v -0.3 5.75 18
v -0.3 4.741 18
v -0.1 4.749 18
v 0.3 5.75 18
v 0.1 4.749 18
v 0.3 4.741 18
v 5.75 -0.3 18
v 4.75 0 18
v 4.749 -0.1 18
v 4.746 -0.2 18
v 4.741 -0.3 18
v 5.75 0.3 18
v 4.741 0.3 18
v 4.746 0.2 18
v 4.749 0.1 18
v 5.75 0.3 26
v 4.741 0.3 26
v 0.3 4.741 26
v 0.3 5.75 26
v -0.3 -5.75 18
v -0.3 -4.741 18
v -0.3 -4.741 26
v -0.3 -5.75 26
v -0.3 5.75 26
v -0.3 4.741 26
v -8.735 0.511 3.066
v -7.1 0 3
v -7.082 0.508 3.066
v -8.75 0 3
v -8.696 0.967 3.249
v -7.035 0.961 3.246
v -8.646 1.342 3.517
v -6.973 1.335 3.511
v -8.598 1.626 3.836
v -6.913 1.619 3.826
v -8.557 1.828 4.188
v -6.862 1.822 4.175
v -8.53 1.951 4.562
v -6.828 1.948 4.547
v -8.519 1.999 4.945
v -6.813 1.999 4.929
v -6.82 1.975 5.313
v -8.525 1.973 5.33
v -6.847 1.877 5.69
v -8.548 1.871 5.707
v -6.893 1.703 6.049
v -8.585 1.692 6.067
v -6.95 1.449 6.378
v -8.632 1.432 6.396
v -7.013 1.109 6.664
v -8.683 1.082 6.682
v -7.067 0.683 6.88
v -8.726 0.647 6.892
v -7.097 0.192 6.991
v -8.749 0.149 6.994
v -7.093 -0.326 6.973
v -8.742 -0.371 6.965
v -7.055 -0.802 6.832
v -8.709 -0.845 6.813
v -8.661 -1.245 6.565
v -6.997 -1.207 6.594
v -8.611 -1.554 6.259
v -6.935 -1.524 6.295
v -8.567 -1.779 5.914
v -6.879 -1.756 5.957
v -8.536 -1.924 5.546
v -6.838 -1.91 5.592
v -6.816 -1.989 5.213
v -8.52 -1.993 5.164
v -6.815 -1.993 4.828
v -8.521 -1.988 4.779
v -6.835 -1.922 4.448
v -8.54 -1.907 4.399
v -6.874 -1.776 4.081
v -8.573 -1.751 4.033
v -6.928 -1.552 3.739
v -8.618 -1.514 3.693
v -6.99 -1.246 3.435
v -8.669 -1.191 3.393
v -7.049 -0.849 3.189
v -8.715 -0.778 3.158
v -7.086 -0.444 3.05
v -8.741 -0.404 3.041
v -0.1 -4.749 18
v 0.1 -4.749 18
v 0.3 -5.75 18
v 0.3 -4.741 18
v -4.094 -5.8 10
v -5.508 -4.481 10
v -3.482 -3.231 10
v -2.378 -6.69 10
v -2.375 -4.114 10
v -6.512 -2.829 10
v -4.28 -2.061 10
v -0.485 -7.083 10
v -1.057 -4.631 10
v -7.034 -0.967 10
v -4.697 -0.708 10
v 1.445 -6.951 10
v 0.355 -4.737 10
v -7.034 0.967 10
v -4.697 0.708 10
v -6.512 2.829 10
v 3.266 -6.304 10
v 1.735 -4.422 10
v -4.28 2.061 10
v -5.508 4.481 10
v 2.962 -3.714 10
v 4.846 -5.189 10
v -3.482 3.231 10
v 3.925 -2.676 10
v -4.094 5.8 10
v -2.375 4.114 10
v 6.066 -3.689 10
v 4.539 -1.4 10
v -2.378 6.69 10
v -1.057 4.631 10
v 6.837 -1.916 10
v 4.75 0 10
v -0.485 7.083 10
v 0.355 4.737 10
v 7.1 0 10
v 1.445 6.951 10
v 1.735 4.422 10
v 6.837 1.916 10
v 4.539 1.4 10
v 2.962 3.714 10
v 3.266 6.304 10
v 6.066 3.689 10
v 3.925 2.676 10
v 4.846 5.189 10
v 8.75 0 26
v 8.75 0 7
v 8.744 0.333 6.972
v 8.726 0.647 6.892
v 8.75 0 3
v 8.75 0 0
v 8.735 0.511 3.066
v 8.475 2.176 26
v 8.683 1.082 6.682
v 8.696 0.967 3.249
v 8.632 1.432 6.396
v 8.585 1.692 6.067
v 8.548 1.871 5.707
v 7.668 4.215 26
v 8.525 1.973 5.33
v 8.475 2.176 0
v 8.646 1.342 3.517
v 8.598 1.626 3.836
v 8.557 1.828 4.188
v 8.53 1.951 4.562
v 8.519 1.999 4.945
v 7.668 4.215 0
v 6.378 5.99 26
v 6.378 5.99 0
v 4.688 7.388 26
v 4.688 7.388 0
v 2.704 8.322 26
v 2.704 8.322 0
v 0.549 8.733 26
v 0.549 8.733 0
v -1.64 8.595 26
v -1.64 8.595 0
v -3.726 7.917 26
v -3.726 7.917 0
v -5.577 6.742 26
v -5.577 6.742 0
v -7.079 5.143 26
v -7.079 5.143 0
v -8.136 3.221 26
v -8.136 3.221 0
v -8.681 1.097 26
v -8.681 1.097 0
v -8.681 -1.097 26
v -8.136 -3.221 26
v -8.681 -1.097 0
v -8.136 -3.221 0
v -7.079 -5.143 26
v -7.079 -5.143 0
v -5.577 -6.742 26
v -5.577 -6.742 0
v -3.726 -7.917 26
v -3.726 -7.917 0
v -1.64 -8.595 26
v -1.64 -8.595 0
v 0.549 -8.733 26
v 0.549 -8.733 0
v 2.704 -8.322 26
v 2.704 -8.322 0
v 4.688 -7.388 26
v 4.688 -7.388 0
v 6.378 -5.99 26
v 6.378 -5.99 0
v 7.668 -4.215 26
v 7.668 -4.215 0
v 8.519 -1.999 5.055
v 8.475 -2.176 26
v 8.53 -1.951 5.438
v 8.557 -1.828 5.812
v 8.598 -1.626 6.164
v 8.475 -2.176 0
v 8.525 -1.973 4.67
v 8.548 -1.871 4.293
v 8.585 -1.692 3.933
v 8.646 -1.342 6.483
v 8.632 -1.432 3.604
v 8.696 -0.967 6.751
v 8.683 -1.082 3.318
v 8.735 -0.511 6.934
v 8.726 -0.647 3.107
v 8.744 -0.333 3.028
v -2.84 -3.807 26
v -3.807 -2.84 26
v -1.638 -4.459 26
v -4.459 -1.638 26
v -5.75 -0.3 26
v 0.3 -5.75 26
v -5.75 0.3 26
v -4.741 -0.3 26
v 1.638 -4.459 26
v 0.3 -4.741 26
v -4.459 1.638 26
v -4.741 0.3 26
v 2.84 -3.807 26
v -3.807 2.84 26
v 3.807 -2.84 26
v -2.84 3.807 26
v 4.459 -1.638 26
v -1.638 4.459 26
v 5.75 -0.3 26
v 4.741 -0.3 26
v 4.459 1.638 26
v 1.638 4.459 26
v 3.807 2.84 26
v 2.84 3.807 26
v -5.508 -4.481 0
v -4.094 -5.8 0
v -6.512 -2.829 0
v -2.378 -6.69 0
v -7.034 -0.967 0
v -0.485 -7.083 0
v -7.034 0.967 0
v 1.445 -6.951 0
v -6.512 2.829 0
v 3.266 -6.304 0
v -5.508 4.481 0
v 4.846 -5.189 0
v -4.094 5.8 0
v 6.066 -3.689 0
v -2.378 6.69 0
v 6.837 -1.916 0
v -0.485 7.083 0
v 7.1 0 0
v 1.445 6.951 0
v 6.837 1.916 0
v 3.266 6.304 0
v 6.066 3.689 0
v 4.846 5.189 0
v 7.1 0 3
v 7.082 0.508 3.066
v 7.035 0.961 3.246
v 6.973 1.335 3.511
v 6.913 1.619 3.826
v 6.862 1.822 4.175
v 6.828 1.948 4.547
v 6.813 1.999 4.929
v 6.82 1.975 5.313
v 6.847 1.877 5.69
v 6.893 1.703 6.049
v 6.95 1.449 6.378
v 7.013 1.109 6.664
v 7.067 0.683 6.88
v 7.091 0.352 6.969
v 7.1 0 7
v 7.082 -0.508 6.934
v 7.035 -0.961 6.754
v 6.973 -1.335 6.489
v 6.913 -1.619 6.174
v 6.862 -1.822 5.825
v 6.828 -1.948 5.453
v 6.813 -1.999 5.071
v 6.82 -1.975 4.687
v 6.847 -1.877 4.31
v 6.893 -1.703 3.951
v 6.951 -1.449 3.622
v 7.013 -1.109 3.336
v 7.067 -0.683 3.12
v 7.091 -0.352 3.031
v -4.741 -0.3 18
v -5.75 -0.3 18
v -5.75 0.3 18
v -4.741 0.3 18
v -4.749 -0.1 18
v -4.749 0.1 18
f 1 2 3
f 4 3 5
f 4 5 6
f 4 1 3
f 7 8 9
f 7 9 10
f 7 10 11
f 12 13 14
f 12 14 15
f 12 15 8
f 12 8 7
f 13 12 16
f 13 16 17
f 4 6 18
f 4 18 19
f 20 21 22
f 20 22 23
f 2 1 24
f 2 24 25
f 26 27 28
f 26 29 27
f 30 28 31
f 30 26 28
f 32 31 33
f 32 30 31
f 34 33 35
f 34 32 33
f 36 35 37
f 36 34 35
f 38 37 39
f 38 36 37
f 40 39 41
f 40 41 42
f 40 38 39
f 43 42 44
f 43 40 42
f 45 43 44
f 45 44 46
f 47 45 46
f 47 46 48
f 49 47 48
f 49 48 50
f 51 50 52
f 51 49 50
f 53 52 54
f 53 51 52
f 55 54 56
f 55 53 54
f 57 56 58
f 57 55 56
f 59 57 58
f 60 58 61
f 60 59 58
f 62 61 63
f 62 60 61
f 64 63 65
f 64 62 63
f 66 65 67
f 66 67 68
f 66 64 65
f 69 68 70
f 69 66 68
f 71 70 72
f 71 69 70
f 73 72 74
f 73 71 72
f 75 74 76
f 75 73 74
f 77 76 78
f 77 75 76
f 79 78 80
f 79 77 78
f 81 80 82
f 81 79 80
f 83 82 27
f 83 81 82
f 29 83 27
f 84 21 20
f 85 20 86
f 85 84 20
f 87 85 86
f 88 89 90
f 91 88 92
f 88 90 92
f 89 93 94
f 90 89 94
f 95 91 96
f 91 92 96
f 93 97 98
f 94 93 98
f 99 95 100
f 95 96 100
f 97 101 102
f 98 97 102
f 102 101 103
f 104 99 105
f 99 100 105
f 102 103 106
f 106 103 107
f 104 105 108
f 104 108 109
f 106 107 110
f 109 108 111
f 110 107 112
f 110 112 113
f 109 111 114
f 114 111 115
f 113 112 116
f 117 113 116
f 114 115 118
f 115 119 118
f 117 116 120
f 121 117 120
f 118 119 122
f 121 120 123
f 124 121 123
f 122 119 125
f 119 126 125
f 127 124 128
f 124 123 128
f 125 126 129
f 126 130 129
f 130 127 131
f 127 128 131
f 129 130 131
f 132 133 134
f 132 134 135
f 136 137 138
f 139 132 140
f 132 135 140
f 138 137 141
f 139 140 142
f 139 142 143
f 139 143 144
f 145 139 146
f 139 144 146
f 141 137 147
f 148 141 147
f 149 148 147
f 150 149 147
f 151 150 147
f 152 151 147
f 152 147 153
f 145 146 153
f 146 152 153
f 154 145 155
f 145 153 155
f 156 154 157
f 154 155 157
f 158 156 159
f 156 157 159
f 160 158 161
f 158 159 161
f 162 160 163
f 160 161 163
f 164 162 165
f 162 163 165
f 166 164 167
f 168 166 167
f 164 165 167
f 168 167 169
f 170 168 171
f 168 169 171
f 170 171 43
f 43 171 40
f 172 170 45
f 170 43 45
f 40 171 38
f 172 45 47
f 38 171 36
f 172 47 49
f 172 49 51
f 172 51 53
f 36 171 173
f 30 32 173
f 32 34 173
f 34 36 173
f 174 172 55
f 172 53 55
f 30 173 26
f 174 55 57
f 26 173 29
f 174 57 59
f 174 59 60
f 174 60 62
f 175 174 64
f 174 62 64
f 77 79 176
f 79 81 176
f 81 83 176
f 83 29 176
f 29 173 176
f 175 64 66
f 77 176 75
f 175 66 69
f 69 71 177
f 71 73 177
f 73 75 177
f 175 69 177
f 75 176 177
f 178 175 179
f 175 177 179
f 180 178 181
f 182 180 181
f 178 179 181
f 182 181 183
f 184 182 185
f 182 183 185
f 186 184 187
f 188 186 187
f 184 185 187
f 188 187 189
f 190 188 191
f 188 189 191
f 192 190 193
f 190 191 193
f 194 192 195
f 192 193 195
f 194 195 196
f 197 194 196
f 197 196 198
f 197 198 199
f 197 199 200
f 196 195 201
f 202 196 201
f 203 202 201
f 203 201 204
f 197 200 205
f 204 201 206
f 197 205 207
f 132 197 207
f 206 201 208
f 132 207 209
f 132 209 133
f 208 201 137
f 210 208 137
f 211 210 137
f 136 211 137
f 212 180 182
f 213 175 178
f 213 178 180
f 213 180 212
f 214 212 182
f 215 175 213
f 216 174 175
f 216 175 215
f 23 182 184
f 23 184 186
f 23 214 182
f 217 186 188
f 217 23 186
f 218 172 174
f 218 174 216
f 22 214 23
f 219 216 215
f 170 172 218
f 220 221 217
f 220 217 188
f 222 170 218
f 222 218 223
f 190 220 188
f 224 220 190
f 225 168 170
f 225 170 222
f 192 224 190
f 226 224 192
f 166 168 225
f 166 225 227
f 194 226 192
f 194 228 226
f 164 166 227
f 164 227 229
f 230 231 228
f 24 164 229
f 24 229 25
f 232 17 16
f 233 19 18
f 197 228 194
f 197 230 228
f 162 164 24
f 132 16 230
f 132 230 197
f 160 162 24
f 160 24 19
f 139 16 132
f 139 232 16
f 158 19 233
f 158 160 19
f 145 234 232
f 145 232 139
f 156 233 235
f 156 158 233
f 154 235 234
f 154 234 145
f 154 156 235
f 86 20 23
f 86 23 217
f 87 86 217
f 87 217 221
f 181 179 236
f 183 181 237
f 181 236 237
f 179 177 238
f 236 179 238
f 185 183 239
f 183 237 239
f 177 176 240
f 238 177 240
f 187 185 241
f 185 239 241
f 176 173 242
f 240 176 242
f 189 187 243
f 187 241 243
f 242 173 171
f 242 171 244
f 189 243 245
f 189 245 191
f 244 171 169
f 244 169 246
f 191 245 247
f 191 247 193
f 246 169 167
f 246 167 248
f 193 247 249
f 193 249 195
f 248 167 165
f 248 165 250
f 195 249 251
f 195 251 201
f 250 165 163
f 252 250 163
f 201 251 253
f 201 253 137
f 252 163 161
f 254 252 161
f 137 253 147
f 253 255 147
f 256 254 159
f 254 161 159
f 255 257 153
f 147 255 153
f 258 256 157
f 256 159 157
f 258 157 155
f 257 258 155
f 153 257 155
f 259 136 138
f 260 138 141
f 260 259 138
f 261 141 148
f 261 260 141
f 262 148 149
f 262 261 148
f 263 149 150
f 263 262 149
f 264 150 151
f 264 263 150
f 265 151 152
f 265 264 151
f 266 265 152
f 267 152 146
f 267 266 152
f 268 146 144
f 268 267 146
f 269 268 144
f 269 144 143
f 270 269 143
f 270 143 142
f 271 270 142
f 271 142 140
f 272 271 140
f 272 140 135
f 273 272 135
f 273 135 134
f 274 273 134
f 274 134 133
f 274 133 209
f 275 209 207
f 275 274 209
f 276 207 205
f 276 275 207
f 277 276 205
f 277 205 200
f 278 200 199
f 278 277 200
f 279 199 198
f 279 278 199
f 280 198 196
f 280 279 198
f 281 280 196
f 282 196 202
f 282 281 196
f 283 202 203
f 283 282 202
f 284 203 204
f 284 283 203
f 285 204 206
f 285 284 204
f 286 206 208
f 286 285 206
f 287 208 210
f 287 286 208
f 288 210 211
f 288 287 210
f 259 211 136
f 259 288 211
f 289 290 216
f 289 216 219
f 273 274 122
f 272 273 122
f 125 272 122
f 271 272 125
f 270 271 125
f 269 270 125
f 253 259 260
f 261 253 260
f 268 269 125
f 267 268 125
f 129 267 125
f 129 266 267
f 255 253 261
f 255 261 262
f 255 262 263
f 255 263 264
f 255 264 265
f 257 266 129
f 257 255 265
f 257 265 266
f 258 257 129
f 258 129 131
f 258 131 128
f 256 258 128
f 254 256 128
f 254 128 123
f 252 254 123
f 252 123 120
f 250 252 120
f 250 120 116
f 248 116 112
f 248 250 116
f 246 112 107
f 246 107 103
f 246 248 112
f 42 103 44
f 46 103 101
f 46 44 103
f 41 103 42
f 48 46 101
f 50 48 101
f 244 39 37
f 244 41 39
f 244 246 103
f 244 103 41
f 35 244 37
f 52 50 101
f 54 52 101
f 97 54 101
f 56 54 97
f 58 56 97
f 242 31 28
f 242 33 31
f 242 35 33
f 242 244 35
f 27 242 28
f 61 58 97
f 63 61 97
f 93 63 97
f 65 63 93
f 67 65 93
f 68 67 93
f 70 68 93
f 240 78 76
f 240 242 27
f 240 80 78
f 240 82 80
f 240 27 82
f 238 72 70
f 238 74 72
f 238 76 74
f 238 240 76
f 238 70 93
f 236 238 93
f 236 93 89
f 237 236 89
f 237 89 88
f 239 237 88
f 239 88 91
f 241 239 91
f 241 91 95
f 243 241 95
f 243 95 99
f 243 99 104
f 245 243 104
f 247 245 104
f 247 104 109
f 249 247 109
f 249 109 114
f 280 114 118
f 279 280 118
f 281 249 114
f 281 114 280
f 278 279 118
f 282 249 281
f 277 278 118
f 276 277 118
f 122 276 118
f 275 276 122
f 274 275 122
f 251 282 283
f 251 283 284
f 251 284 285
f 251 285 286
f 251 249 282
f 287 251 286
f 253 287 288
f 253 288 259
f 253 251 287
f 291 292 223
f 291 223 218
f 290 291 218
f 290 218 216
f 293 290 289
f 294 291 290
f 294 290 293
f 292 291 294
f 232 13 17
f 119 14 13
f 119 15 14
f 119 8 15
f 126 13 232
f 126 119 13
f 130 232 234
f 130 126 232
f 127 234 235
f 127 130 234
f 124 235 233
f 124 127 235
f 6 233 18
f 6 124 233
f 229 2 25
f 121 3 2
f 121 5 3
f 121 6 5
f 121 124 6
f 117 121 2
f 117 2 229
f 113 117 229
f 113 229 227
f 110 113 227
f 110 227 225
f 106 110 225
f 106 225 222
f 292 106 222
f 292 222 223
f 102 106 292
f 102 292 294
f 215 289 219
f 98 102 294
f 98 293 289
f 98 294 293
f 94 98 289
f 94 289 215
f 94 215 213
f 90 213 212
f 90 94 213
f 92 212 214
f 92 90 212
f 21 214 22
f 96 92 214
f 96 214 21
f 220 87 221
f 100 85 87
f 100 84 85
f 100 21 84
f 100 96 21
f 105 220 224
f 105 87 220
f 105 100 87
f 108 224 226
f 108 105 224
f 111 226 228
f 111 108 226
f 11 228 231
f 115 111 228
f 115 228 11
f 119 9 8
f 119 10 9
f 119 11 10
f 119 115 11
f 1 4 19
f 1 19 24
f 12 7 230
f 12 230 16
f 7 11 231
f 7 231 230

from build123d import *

# Parameters (mm, degrees)
SKETCH_1_R               = 8.75
SKETCH_1_R_2             = 7.1
EXTRUDE_1_DEPTH          = 10
CUT_EXTRUDE_1_DEPTH      = 20
CUT_EXTRUDE_1_DEPTH_BACK = 10
SKETCH_2_R               = 2
SKETCH_3_R               = 8.75
SKETCH_3_R_2             = 4.75
EXTRUDE_2_DEPTH          = 16
CUT_EXTRUDE_START        = -8
CUT_EXTRUDE_2_DEPTH      = 8


with BuildPart() as part:
    # 草图1 → 凸台-拉伸1 (new body)
    with BuildSketch(Plane.XY):
        Circle(SKETCH_1_R)
        Circle(SKETCH_1_R_2, mode=Mode.SUBTRACT)
    extrude(amount=EXTRUDE_1_DEPTH)

    # 草图2 → 切除-拉伸1 (cut, two sides: drawn at the far end of the back side and taken through both)
    with BuildSketch(Plane(origin=(0, 0, 0), x_dir=(0, 0, -1), z_dir=(1, 0, 0)).offset(-CUT_EXTRUDE_1_DEPTH_BACK)):
        with Locations((-5, 0)):
            Circle(SKETCH_2_R)
    extrude(amount=CUT_EXTRUDE_1_DEPTH + CUT_EXTRUDE_1_DEPTH_BACK, mode=Mode.SUBTRACT)

    # 草图3 → 凸台-拉伸2 (add)
    with BuildSketch(Plane.XY.offset(10)):
        Circle(SKETCH_3_R)
        Circle(SKETCH_3_R_2, mode=Mode.SUBTRACT)
    extrude(amount=EXTRUDE_2_DEPTH)

    # 草图4 → 切除-拉伸2 (cut)
    with BuildSketch(Plane.XY.offset(26).offset(CUT_EXTRUDE_START)):
        with BuildLine():
            Line((-0.3, -4.740516849), (-0.3, -5.75))
            Line((-0.3, -5.75), (0.3, -5.75))
            Line((0.3, -5.75), (0.3, -4.740516849))
            ThreePointArc((0.3, -4.740516849), (0, -4.75), (-0.3, -4.740516849))
        make_face()
        with BuildLine():
            Line((-5.75, -0.3), (-4.740516849, -0.3))
            ThreePointArc((-4.740516849, -0.3), (-4.75, 0), (-4.740516849, 0.3))
            Line((-4.740516849, 0.3), (-5.75, 0.3))
            Line((-5.75, 0.3), (-5.75, -0.3))
        make_face()
        with BuildLine():
            Line((-0.3, 5.75), (-0.3, 4.740516849))
            ThreePointArc((-0.3, 4.740516849), (0, 4.75), (0.3, 4.740516849))
            Line((0.3, 4.740516849), (0.3, 5.75))
            Line((0.3, 5.75), (-0.3, 5.75))
        make_face()
        with BuildLine():
            Line((5.75, 0.3), (4.740516849, 0.3))
            ThreePointArc((4.740516849, 0.3), (4.75, 0), (4.740516849, -0.3))
            Line((4.740516849, -0.3), (5.75, -0.3))
            Line((5.75, -0.3), (5.75, 0.3))
        make_face()
    extrude(amount=CUT_EXTRUDE_2_DEPTH, mode=Mode.SUBTRACT)


solid = part.part
